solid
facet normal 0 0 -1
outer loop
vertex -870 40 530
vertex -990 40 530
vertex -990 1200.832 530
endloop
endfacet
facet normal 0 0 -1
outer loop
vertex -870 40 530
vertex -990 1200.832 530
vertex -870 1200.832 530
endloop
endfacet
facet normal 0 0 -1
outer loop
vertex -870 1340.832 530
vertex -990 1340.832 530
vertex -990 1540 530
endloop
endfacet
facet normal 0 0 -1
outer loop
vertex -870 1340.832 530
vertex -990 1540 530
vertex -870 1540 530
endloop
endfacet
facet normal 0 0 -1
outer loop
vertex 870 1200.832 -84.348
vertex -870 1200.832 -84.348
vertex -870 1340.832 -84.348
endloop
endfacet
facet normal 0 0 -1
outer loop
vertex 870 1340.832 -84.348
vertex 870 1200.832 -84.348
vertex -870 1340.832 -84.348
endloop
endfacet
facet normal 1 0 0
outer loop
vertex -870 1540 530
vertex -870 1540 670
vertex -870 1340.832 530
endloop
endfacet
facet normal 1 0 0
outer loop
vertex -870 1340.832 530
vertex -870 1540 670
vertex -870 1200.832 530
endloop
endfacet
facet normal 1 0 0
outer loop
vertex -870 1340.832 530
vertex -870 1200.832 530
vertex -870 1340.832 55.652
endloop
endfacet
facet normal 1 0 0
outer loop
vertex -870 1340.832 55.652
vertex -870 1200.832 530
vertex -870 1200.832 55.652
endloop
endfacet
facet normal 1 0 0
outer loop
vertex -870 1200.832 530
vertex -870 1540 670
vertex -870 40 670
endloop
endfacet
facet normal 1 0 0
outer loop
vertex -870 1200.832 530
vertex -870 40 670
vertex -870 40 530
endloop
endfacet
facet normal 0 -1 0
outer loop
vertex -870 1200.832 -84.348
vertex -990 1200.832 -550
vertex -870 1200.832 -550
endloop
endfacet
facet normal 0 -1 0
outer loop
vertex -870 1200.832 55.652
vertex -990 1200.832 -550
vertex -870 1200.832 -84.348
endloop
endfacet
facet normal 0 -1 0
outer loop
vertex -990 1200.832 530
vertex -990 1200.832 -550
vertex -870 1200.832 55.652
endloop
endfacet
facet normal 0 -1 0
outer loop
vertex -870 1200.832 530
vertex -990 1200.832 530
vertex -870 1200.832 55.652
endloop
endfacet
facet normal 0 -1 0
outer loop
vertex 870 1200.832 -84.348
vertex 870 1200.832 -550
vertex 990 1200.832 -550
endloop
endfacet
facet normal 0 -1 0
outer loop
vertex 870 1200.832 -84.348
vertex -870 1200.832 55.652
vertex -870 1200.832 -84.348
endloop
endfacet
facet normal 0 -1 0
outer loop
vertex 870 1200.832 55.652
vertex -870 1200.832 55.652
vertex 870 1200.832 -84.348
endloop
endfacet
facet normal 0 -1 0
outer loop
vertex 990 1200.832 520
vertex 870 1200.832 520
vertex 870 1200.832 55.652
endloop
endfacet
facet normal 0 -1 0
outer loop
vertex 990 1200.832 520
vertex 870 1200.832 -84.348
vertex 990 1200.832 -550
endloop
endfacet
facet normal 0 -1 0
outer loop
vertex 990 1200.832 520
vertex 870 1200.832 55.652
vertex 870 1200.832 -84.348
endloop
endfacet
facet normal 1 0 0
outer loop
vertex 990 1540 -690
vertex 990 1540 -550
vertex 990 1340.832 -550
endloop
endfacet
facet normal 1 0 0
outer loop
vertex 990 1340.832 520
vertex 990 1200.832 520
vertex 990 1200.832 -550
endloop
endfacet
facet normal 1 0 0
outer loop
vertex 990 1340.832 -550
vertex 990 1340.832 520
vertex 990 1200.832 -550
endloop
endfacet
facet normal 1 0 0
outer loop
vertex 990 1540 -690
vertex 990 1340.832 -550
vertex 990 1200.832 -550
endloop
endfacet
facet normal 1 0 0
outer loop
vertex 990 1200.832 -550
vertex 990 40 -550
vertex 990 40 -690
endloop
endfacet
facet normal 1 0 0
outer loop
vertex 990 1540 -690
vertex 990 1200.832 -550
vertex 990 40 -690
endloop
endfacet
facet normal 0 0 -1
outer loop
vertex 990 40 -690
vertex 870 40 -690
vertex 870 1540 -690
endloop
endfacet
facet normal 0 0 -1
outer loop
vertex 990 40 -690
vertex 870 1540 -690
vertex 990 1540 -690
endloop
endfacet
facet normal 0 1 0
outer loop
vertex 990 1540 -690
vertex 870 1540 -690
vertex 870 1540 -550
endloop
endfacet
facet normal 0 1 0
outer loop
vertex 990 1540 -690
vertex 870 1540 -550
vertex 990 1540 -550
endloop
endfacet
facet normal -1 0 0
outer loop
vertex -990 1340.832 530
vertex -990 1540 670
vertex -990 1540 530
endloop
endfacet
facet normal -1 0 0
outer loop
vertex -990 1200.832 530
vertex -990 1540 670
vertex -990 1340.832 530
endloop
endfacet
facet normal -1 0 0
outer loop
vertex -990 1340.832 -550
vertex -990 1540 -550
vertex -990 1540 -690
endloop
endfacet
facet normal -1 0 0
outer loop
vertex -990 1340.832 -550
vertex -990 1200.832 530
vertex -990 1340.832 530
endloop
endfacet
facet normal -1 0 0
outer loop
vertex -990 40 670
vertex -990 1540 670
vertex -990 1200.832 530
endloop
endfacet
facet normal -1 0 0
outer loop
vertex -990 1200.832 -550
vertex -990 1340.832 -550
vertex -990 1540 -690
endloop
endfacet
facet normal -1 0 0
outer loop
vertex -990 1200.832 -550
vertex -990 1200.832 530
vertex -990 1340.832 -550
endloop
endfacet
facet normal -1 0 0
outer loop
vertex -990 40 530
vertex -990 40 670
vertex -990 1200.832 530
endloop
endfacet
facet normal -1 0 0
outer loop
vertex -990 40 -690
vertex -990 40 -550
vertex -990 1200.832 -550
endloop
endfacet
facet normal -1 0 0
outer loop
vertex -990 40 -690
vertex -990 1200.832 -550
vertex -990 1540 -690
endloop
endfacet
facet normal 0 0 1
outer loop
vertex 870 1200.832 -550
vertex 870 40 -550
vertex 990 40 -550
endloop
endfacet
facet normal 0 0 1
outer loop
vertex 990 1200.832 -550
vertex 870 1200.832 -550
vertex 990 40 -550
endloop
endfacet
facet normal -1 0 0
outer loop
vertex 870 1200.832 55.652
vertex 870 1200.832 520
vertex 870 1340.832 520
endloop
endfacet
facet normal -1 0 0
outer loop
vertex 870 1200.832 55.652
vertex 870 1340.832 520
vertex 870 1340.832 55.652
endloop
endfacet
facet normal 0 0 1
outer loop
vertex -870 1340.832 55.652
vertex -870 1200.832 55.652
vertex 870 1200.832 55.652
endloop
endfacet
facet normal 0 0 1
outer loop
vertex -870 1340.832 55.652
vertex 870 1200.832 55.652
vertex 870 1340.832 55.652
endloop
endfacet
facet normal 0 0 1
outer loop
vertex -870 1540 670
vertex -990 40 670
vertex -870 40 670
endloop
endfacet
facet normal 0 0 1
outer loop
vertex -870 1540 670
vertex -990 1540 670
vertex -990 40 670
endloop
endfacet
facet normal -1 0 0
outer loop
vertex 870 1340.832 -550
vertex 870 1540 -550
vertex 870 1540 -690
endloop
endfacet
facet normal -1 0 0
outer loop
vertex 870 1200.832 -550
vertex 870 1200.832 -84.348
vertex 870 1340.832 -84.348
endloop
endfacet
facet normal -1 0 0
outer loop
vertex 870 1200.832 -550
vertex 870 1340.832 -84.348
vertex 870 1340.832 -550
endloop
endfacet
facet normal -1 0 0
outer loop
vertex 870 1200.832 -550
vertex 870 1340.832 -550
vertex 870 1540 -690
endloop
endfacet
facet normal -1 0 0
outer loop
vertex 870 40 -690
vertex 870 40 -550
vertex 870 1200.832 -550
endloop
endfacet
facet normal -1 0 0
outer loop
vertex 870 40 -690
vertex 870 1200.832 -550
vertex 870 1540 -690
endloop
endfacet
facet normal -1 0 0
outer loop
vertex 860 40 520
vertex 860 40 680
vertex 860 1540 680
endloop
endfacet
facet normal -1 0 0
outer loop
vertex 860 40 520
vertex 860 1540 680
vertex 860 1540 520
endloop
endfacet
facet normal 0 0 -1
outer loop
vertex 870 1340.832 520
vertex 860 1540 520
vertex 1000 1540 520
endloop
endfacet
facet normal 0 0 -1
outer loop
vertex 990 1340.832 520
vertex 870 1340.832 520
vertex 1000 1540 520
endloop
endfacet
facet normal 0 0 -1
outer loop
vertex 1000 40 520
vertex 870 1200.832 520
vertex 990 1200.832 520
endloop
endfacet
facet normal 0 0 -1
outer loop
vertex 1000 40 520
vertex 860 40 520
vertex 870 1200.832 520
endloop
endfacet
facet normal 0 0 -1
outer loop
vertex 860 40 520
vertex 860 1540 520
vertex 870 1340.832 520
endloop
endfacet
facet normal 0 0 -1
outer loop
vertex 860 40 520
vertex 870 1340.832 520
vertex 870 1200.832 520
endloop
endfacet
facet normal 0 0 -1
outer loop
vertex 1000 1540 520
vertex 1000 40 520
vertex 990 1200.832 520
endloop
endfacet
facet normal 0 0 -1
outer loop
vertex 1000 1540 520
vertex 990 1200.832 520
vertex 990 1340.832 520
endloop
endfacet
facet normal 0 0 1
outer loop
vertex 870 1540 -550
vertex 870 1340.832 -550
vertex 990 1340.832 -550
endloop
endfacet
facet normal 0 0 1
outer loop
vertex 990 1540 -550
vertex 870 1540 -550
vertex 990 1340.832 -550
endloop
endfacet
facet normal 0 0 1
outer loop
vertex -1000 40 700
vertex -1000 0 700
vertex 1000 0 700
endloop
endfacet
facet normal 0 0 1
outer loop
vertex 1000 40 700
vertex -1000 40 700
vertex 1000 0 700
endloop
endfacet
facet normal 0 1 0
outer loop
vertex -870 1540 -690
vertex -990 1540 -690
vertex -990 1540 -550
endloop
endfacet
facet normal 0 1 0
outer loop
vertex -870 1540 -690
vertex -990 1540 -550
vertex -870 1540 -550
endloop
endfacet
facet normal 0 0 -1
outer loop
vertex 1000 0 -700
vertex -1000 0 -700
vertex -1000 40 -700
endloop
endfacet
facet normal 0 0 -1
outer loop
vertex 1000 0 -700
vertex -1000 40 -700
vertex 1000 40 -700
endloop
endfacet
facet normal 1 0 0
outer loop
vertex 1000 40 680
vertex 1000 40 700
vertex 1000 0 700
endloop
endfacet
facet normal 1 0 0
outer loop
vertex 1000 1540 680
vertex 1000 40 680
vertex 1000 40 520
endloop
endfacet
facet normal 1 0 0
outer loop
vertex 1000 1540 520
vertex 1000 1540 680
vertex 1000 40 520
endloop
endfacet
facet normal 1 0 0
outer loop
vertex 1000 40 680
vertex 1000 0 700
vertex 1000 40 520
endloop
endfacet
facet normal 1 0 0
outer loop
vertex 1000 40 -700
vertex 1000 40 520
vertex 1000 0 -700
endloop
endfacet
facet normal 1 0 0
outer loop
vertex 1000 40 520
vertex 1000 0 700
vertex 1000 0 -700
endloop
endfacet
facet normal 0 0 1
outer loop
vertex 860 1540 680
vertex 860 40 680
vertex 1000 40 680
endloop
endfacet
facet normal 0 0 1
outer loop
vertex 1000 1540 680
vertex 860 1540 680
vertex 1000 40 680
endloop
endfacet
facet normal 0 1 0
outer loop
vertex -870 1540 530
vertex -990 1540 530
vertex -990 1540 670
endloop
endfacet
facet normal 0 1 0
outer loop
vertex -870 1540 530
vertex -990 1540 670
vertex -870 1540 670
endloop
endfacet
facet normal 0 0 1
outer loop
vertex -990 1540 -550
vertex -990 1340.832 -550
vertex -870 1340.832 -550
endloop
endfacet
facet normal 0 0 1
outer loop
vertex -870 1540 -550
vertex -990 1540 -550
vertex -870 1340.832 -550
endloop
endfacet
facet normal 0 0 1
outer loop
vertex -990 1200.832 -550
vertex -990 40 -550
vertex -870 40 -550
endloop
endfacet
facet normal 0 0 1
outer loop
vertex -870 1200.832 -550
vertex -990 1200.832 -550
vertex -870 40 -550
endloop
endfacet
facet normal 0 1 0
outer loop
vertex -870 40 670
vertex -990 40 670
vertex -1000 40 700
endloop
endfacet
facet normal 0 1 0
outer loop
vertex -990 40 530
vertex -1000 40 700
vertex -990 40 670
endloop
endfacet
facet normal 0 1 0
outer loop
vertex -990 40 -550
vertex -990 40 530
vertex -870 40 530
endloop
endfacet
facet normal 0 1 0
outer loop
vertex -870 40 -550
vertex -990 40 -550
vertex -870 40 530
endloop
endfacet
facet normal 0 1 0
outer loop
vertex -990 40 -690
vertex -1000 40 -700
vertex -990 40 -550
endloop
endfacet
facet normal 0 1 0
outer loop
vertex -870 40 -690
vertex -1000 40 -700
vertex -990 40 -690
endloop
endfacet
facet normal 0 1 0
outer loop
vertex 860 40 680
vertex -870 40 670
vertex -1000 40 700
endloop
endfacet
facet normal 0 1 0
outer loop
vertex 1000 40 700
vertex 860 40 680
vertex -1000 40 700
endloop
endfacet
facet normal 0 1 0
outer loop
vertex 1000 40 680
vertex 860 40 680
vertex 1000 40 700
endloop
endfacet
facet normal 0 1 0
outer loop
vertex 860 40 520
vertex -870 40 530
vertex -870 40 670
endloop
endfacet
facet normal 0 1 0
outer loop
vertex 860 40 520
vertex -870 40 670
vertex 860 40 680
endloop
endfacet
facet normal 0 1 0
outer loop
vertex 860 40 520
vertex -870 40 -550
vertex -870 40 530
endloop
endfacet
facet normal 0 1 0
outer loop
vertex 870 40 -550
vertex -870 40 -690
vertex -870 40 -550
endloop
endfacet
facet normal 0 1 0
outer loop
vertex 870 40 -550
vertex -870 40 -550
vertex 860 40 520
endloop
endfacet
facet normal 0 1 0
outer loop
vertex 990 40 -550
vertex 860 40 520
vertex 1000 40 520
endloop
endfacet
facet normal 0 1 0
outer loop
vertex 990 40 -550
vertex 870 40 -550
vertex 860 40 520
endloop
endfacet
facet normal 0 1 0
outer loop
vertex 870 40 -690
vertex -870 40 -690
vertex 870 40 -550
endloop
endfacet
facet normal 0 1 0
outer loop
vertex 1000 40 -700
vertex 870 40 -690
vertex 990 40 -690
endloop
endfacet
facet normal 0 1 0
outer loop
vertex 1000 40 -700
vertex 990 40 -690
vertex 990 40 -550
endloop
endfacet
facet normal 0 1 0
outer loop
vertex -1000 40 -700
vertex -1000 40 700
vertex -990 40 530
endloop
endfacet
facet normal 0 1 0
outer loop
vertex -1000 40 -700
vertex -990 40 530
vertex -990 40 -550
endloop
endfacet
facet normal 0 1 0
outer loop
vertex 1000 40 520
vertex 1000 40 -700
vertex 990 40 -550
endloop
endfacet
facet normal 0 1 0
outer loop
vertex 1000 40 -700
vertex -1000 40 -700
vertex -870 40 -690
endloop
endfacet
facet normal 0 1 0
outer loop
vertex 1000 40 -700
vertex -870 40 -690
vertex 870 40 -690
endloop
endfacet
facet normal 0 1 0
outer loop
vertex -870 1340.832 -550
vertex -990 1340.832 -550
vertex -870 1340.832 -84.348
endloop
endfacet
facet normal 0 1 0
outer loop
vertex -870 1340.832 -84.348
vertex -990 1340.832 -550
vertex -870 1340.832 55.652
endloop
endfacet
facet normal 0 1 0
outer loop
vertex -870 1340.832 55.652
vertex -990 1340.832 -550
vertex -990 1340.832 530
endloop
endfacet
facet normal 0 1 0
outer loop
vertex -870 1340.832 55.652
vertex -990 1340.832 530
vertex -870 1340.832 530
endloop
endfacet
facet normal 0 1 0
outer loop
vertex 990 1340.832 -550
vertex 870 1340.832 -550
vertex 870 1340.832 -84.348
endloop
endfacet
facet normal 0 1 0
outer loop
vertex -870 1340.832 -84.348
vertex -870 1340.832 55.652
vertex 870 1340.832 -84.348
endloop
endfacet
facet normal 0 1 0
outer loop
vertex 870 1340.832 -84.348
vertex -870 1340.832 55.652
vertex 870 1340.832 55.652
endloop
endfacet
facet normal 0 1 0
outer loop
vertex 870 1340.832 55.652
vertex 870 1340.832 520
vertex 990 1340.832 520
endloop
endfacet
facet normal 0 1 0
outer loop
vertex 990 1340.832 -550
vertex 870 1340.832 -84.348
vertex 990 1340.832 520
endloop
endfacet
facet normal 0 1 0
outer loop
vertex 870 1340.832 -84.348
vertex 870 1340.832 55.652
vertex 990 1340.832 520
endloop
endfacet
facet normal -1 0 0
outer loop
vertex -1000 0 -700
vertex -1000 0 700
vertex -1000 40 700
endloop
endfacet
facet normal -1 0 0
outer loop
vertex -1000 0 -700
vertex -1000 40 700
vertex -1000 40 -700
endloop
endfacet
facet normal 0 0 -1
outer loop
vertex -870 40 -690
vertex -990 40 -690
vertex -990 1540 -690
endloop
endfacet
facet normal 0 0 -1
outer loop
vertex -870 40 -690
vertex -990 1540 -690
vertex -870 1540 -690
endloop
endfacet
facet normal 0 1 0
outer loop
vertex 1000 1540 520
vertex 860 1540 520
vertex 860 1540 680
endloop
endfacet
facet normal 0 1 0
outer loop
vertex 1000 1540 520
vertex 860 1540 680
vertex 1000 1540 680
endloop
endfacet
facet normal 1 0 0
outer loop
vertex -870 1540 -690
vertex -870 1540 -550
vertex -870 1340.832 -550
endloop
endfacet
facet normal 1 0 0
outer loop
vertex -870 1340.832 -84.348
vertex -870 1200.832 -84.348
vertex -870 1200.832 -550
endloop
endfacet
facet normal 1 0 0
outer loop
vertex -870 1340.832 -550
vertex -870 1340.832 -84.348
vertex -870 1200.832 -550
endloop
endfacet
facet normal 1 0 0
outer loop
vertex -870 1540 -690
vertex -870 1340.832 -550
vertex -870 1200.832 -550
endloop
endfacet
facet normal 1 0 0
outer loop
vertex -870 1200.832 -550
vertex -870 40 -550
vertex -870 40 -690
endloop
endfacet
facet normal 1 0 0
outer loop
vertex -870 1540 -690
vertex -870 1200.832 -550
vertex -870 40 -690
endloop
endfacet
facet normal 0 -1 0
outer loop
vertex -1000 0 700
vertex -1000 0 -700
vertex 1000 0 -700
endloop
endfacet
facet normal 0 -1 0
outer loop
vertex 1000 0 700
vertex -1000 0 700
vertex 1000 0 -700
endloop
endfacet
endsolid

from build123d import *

# Parameters (mm, degrees)
SKETCH1_W           = 2000
SKETCH1_H           = 1400
BOSS_EXTRUDE1_DEPTH = 40
SKETCH4_W           = 120
SKETCH4_H           = 140
SKETCH4_W_2         = 140
SKETCH4_H_2         = 160
BOSS_EXTRUDE2_DEPTH = 1500
SKETCH5_W           = 120
SKETCH5_H           = 140
BOSS_EXTRUDE3_DEPTH = 1220
SKETCH6_W           = 140
SKETCH6_H           = 140
BOSS_EXTRUDE4_DEPTH = 1740


with BuildPart() as part:
    # Sketch1 → Boss-Extrude1 (new body)
    with BuildSketch(Plane(origin=(0, 0, 0), x_dir=(1, 0, 0), z_dir=(0, 1, 0))):
        Rectangle(SKETCH1_W, SKETCH1_H)
    extrude(amount=BOSS_EXTRUDE1_DEPTH)

    # Sketch4 → Boss-Extrude2 (add)
    with BuildSketch(Plane(origin=(0, 40, 0), x_dir=(1, 0, 0), z_dir=(0, 1, 0))):
        with Locations((-930, -600)):
            Rectangle(SKETCH4_W, SKETCH4_H)
        with Locations((930, 620)):
            Rectangle(SKETCH4_W, SKETCH4_H)
        with Locations((930, -600)):
            Rectangle(SKETCH4_W_2, SKETCH4_H_2)
        with Locations((-930, 620)):
            Rectangle(SKETCH4_W, SKETCH4_H)
    extrude(amount=BOSS_EXTRUDE2_DEPTH)

    # Sketch5 → Boss-Extrude3 (add)
    with BuildSketch(Plane.XY.offset(670)):
        with Locations((-930, 1270.83173518)):
            Rectangle(SKETCH5_W, SKETCH5_H)
        with Locations((930, 1270.83173518)):
            Rectangle(SKETCH5_W, SKETCH5_H)
    extrude(amount=-BOSS_EXTRUDE3_DEPTH)

    # Sketch6 → Boss-Extrude4 (add)
    with BuildSketch(Plane.ZY.offset(-870)):
        with Locations((-14.348286906, 1270.83173518)):
            Rectangle(SKETCH6_W, SKETCH6_H)
    extrude(amount=BOSS_EXTRUDE4_DEPTH)


solid = part.part
